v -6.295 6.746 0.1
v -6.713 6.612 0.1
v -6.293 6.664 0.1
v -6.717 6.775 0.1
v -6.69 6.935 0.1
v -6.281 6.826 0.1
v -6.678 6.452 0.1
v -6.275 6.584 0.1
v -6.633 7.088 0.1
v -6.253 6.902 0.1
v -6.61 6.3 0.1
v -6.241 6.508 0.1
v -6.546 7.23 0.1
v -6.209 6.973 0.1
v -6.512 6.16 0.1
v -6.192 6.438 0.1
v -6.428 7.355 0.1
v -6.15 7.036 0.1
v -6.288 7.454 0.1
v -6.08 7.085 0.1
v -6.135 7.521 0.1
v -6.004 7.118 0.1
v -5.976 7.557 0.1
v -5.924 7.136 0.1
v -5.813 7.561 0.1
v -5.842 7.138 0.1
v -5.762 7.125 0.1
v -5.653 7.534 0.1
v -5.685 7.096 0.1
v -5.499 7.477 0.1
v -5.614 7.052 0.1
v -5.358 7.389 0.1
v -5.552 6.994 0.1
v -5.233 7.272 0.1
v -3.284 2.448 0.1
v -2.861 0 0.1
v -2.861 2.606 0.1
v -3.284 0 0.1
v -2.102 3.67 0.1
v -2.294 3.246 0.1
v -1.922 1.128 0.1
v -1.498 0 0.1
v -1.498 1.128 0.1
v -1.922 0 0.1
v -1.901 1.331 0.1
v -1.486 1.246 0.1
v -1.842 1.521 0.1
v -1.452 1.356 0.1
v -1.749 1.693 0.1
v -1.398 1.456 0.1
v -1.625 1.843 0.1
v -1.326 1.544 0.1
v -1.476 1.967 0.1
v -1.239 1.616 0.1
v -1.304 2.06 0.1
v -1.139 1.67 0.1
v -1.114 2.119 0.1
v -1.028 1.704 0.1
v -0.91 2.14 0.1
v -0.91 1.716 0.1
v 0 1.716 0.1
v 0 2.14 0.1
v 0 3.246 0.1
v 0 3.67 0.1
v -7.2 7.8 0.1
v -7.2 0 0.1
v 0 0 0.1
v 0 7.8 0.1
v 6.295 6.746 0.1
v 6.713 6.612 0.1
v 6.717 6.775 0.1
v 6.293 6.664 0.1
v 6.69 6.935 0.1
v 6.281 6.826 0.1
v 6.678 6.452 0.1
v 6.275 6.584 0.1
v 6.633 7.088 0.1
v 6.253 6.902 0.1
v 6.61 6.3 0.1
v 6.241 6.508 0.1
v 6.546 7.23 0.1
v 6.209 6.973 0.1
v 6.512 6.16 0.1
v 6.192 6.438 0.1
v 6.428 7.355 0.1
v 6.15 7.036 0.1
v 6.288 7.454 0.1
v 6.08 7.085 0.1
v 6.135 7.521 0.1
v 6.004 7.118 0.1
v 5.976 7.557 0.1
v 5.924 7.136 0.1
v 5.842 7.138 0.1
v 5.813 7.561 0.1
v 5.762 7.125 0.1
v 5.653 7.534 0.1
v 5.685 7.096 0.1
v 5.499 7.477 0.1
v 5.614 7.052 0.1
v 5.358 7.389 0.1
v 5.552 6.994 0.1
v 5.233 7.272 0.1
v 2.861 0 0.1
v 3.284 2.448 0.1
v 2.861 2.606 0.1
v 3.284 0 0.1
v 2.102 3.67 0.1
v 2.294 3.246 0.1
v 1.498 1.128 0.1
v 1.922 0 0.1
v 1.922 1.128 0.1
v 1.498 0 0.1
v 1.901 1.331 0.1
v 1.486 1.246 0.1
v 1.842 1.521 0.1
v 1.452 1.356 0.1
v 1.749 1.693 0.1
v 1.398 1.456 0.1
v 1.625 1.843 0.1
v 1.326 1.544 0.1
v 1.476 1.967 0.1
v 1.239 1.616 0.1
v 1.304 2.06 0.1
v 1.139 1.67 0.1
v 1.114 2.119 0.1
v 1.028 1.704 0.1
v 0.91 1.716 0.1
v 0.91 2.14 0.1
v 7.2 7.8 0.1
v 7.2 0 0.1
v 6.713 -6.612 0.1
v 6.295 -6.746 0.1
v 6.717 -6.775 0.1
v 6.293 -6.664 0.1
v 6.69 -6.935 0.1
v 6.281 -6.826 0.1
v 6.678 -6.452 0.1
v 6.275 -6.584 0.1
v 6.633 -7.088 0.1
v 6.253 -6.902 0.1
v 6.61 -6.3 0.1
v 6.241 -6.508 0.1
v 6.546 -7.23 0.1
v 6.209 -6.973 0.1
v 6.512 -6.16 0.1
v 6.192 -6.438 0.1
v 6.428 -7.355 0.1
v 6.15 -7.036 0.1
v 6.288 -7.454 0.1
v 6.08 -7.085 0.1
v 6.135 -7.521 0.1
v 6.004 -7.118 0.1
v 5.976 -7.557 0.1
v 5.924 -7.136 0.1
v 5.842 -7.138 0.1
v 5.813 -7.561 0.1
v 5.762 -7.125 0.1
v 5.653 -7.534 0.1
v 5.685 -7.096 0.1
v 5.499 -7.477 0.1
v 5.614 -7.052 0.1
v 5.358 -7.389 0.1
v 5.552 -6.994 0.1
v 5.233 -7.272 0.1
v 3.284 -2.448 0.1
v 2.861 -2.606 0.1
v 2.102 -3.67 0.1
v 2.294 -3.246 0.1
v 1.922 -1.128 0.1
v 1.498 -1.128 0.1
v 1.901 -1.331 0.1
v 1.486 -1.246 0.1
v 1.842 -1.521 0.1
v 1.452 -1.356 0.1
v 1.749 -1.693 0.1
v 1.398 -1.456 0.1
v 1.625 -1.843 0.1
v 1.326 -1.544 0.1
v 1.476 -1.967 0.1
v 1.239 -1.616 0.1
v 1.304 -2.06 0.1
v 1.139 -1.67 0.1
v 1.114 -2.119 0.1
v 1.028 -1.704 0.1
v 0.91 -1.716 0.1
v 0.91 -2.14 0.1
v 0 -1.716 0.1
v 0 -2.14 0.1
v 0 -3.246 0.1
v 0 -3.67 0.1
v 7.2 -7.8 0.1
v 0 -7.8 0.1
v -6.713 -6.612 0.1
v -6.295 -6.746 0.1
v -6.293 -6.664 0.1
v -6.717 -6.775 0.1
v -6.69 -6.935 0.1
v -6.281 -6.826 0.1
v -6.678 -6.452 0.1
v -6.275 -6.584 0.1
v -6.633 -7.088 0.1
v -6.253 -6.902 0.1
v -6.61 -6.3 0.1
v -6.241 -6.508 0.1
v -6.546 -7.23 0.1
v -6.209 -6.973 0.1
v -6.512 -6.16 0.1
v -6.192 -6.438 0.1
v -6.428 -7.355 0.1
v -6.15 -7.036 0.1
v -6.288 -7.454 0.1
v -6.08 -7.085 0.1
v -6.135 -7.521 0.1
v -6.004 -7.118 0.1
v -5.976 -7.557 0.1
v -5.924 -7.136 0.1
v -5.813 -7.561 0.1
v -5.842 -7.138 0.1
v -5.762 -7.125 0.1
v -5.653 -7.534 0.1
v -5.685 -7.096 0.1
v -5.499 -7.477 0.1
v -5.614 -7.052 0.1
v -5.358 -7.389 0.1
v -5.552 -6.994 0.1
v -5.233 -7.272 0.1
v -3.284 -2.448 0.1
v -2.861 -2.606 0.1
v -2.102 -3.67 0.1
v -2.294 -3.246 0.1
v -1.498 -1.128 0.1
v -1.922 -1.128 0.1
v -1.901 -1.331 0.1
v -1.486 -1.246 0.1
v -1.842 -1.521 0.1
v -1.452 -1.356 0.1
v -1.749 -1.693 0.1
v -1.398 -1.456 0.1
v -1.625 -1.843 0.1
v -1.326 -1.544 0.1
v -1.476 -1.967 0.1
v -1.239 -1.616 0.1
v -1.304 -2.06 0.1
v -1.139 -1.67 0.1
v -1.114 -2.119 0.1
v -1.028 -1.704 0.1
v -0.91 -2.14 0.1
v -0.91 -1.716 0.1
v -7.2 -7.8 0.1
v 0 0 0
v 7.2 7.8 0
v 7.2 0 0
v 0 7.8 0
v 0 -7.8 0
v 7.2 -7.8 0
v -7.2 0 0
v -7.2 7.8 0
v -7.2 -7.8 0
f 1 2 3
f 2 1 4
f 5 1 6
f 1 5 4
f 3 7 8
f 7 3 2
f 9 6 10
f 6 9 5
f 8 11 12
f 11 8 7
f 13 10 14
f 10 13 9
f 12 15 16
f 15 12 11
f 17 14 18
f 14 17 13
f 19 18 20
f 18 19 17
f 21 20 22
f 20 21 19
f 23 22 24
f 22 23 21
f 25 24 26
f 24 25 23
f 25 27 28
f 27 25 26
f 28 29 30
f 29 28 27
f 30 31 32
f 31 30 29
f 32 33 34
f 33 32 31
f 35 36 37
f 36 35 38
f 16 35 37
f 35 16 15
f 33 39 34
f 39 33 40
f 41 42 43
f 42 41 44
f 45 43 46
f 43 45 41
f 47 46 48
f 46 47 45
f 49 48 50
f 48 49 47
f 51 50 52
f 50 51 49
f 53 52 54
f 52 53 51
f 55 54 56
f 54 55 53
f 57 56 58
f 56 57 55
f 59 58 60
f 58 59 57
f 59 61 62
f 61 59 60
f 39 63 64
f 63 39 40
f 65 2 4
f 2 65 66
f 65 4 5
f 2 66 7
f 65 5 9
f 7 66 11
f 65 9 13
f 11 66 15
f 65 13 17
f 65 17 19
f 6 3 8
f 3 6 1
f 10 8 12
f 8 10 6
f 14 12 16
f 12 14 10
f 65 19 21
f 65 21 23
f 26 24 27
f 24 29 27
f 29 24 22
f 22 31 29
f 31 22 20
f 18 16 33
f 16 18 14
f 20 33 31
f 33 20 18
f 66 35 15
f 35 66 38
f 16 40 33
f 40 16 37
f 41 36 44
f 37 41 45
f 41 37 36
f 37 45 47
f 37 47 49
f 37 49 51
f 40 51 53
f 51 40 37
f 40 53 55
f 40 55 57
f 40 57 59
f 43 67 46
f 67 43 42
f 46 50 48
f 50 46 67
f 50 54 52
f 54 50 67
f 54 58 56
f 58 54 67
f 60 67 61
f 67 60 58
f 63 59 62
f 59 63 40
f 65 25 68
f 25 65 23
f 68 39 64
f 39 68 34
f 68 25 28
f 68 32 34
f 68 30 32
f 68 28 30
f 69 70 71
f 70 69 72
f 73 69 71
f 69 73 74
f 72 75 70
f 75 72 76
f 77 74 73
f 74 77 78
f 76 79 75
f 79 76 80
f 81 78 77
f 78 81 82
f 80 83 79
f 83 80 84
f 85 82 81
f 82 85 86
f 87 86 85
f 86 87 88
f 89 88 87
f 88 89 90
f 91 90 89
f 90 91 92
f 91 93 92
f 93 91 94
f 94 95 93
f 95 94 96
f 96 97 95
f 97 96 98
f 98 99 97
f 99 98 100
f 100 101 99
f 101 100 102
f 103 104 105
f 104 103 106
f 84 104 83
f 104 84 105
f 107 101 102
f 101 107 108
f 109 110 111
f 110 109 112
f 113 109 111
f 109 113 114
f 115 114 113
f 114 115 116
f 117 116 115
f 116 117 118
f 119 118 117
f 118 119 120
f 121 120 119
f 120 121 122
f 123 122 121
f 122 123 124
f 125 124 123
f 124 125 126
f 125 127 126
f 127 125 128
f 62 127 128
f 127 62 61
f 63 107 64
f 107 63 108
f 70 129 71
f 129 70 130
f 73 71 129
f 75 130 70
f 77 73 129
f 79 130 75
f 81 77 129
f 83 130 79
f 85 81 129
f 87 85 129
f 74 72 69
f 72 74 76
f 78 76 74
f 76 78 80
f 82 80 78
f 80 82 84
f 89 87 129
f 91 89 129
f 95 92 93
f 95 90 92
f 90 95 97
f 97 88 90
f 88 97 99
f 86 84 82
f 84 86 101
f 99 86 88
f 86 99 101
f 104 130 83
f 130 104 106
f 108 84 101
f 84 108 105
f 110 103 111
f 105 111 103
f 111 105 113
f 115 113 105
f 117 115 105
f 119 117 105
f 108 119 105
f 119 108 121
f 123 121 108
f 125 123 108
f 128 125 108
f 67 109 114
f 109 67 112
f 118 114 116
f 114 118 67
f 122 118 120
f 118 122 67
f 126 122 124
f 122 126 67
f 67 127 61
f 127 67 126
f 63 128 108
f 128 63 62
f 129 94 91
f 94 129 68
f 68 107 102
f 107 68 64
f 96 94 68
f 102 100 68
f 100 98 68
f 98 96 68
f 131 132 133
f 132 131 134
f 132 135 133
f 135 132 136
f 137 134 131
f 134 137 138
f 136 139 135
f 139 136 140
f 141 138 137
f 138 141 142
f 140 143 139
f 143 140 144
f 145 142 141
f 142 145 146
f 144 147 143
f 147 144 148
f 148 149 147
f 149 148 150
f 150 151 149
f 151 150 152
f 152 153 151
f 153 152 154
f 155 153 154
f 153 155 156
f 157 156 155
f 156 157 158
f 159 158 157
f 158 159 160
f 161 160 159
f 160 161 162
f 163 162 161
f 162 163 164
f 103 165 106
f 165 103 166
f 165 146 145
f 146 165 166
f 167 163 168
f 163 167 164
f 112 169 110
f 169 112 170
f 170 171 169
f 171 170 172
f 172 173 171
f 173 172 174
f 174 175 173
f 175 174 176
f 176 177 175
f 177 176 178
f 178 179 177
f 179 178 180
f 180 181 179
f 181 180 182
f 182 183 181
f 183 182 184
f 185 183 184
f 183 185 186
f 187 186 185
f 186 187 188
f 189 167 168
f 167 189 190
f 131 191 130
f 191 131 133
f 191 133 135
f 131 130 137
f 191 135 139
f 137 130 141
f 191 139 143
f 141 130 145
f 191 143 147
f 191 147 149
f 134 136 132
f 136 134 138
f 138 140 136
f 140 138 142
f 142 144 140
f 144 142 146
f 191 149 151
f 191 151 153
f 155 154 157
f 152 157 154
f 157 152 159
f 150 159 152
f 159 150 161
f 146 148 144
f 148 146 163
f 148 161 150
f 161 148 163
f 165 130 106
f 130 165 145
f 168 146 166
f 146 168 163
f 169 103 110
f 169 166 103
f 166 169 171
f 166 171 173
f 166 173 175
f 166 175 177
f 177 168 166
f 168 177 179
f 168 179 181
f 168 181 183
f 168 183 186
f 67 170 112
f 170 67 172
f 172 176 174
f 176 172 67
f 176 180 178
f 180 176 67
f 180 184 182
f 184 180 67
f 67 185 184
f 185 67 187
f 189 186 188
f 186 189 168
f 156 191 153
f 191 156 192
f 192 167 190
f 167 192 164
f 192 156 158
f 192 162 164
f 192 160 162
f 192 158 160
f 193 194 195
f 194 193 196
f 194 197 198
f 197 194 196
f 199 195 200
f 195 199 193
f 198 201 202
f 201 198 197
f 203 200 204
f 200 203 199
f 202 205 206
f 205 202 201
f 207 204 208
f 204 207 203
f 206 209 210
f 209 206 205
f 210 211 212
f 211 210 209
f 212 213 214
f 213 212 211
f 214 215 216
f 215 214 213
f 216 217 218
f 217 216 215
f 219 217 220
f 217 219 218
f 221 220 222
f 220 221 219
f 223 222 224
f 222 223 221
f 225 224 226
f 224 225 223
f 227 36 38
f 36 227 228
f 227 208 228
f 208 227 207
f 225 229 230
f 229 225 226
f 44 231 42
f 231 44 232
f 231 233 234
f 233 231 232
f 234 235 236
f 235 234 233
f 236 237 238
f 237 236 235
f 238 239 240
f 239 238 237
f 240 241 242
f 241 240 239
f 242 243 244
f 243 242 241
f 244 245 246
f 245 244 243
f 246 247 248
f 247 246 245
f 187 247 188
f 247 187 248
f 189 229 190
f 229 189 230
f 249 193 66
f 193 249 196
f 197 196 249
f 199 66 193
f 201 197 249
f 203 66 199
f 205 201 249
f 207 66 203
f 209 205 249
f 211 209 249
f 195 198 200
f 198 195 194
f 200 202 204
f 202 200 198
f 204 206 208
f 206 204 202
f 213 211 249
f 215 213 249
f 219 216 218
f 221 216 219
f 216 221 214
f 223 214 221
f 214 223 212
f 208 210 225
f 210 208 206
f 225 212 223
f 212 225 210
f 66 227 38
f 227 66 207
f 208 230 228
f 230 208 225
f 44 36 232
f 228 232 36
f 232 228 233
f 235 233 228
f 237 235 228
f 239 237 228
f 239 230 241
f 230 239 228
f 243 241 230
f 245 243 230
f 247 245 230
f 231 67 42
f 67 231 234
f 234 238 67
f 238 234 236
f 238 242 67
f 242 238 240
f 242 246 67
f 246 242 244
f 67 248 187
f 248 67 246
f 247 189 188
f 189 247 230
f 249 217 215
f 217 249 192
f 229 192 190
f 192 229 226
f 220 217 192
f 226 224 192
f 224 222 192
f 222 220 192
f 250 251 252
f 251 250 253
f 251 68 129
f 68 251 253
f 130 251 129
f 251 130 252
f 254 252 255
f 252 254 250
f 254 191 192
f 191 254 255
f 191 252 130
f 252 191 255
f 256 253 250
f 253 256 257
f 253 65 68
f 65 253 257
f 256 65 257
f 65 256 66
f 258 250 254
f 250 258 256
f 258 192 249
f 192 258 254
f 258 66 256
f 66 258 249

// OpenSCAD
// file: ../p/box3-12.scad
use <../lib.scad>
function ldraw_lib__box3_12() = [
// 0 Box with 3 Adjacent Faces without Any Edges
// 0 Name: box3-12.dat
// 0 Author: Damien Roux [Darats]
// 0 !LDRAW_ORG Primitive UPDATE 2014-02
// 0 !LICENSE Licensed under CC BY 4.0 : see CAreadme.txt
// 
// 0 BFC CERTIFY CCW
  [0,"BFC","CERTIFY"],
  [0,"BFC","CCW"],
// 
// 0 !HISTORY 2014-12-23 [PTadmin] Official Update 2014-02
// 
// 
// 4 16 1 1 1 1 1 -1 -1 1 -1 -1 1 1
  [4,16,1,1,1,1,1,-1,-1,1,-1,-1,1,1],
// 4 16 1 1 1 1 -1 1 1 -1 -1 1 1 -1
  [4,16,1,1,1,1,-1,1,1,-1,-1,1,1,-1],
// 4 16 1 1 1 -1 1 1 -1 -1 1 1 -1 1
  [4,16,1,1,1,-1,1,1,-1,-1,1,1,-1,1],
];
module ldraw_lib__box3_12(step=0, col=false, unit=2/5, alt=false, line=0.2, solid=!$preview)
    makepoly(ldraw_lib__box3_12(), step=step, col=col, unit=unit, alt=alt, line=line, solid=solid);
ldraw_lib__box3_12(line=0.2);
// main file
use <../lib.scad>
use <../p/box3-12.scad>
use <s/4107582es01.scad>
function ldraw_lib__4107582e() = [
// 0 Sticker  2.0 x  1.8 with Black Jerrican Outline
// 0 Name: 4107582e.dat
// 0 Author: Damien Roux [Darats]
// 0 !LDRAW_ORG Part UPDATE 2014-02
// 0 !LICENSE Licensed under CC BY 4.0 : see CAreadme.txt
// 
// 0 BFC CERTIFY CCW
  [0,"BFC","CERTIFY"],
  [0,"BFC","CCW"],
// 
// 0 !KEYWORDS Jerry Can, jerrycan, Set 5561
// 
// 0 !HISTORY 2014-12-23 [PTadmin] Official Update 2014-02
// 
// 
// 1 16 0 -0.25 0 1 0 0 0 1 0 0 0 1 s\4107582es01.dat
  [1,16,0,-0.25,0,1,0,0,0,1,0,0,0,1, ldraw_lib__s__4107582es01()],
// 1 16 0 -0.25 0 -1 0 0 0 1 0 0 0 1 s\4107582es01.dat
  [1,16,0,-0.25,0,-1,0,0,0,1,0,0,0,1, ldraw_lib__s__4107582es01()],
// 1 16 0 -0.25 0 -1 0 0 0 1 0 0 0 -1 s\4107582es01.dat
  [1,16,0,-0.25,0,-1,0,0,0,1,0,0,0,-1, ldraw_lib__s__4107582es01()],
// 1 16 0 -0.25 0 1 0 0 0 1 0 0 0 -1 s\4107582es01.dat
  [1,16,0,-0.25,0,1,0,0,0,1,0,0,0,-1, ldraw_lib__s__4107582es01()],
// 
// 1 16 9 -0.125 9.75 0 0 9 0 0.125 0 9.75 0 0 box3-12.dat
  [1,16,9,-0.125,9.75,0,0,9,0,0.125,0,9.75,0,0, ldraw_lib__box3_12()],
// 1 16 9 -0.125 -9.75 0 0 9 0 0.125 0 -9.75 0 0 box3-12.dat
  [1,16,9,-0.125,-9.75,0,0,9,0,0.125,0,-9.75,0,0, ldraw_lib__box3_12()],
// 1 16 -9 -0.125 9.75 0 0 -9 0 0.125 0 9.75 0 0 box3-12.dat
  [1,16,-9,-0.125,9.75,0,0,-9,0,0.125,0,9.75,0,0, ldraw_lib__box3_12()],
// 1 16 -9 -0.125 -9.75 0 0 -9 0 0.125 0 -9.75 0 0 box3-12.dat
  [1,16,-9,-0.125,-9.75,0,0,-9,0,0.125,0,-9.75,0,0, ldraw_lib__box3_12()],
];
module ldraw_lib__4107582e(step=0, col=false, unit=2/5, alt=false, line=0.2, solid=!$preview)
    makepoly(ldraw_lib__4107582e(), step=step, col=col, unit=unit, alt=alt, line=line, solid=solid);
ldraw_lib__4107582e(line=0.2);
